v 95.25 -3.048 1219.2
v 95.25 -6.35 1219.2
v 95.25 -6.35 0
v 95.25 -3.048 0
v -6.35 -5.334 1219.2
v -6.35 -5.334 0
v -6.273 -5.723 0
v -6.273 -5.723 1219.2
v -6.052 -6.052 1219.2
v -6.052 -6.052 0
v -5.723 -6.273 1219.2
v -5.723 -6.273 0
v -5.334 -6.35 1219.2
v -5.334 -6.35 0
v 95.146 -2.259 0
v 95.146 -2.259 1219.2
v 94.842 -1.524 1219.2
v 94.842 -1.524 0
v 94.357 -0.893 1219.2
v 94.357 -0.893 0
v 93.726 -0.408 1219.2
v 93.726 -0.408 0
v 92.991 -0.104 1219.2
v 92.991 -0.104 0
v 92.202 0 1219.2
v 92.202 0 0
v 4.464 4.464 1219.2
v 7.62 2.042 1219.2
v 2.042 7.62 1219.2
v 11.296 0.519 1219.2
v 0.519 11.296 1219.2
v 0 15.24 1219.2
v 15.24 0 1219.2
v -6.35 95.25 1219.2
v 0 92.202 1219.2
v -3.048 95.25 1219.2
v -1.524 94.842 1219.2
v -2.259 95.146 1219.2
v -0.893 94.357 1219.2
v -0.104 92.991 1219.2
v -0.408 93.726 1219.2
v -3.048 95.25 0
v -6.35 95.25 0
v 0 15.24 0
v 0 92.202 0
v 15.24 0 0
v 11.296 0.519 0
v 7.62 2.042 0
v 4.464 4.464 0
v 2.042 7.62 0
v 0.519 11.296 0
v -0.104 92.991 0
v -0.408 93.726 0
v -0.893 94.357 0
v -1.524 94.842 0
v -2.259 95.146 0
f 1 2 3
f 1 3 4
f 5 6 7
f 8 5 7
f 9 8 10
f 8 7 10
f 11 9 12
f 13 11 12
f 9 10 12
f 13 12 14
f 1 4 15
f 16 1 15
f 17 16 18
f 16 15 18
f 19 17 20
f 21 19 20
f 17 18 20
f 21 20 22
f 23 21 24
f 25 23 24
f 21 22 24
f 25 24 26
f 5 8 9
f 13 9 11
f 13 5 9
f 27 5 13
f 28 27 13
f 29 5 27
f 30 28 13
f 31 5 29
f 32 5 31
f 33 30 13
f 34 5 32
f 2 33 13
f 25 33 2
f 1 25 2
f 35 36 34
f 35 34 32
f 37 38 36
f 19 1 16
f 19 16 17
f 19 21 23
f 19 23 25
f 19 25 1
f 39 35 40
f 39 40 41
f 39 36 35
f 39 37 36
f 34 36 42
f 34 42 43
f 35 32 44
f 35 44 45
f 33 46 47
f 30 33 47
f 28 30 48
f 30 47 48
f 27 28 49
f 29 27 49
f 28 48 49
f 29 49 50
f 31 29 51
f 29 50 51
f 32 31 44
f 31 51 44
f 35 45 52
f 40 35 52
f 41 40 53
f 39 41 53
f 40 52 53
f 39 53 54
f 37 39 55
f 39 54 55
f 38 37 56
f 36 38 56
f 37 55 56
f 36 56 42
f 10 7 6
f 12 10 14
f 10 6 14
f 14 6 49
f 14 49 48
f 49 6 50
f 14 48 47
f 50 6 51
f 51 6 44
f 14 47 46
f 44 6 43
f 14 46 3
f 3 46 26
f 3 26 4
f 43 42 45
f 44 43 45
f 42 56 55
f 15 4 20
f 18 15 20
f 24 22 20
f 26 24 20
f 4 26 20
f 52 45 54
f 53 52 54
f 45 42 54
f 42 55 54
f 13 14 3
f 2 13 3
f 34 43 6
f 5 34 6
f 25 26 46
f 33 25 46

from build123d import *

# Parameters (mm, degrees)
BOSS_EXTRUDE1_DEPTH = 1219.2


with BuildPart() as part:
    # Sketch3 → Boss-Extrude1 (new body)
    with BuildSketch(Plane.XY):
        with BuildLine():
            Line((0, 15.24), (0, 92.202))
            ThreePointArc((0, 92.202), (-0.892738531, 94.357261469), (-3.048, 95.25))
            Line((-3.048, 95.25), (-6.35, 95.25))
            Line((-6.35, 95.25), (-6.35, -5.334))
            ThreePointArc((-6.35, -5.334), (-6.05242049, -6.05242049), (-5.334, -6.35))
            Line((-5.334, -6.35), (95.25, -6.35))
            Line((95.25, -6.35), (95.25, -3.048))
            ThreePointArc((95.25, -3.048), (94.357261469, -0.892738531), (92.202, 0))
            Line((92.202, 0), (15.24, 0))
            ThreePointArc((15.24, 0), (4.463692655, 4.463692655), (0, 15.24))
        make_face()
    extrude(amount=BOSS_EXTRUDE1_DEPTH)


solid = part.part
